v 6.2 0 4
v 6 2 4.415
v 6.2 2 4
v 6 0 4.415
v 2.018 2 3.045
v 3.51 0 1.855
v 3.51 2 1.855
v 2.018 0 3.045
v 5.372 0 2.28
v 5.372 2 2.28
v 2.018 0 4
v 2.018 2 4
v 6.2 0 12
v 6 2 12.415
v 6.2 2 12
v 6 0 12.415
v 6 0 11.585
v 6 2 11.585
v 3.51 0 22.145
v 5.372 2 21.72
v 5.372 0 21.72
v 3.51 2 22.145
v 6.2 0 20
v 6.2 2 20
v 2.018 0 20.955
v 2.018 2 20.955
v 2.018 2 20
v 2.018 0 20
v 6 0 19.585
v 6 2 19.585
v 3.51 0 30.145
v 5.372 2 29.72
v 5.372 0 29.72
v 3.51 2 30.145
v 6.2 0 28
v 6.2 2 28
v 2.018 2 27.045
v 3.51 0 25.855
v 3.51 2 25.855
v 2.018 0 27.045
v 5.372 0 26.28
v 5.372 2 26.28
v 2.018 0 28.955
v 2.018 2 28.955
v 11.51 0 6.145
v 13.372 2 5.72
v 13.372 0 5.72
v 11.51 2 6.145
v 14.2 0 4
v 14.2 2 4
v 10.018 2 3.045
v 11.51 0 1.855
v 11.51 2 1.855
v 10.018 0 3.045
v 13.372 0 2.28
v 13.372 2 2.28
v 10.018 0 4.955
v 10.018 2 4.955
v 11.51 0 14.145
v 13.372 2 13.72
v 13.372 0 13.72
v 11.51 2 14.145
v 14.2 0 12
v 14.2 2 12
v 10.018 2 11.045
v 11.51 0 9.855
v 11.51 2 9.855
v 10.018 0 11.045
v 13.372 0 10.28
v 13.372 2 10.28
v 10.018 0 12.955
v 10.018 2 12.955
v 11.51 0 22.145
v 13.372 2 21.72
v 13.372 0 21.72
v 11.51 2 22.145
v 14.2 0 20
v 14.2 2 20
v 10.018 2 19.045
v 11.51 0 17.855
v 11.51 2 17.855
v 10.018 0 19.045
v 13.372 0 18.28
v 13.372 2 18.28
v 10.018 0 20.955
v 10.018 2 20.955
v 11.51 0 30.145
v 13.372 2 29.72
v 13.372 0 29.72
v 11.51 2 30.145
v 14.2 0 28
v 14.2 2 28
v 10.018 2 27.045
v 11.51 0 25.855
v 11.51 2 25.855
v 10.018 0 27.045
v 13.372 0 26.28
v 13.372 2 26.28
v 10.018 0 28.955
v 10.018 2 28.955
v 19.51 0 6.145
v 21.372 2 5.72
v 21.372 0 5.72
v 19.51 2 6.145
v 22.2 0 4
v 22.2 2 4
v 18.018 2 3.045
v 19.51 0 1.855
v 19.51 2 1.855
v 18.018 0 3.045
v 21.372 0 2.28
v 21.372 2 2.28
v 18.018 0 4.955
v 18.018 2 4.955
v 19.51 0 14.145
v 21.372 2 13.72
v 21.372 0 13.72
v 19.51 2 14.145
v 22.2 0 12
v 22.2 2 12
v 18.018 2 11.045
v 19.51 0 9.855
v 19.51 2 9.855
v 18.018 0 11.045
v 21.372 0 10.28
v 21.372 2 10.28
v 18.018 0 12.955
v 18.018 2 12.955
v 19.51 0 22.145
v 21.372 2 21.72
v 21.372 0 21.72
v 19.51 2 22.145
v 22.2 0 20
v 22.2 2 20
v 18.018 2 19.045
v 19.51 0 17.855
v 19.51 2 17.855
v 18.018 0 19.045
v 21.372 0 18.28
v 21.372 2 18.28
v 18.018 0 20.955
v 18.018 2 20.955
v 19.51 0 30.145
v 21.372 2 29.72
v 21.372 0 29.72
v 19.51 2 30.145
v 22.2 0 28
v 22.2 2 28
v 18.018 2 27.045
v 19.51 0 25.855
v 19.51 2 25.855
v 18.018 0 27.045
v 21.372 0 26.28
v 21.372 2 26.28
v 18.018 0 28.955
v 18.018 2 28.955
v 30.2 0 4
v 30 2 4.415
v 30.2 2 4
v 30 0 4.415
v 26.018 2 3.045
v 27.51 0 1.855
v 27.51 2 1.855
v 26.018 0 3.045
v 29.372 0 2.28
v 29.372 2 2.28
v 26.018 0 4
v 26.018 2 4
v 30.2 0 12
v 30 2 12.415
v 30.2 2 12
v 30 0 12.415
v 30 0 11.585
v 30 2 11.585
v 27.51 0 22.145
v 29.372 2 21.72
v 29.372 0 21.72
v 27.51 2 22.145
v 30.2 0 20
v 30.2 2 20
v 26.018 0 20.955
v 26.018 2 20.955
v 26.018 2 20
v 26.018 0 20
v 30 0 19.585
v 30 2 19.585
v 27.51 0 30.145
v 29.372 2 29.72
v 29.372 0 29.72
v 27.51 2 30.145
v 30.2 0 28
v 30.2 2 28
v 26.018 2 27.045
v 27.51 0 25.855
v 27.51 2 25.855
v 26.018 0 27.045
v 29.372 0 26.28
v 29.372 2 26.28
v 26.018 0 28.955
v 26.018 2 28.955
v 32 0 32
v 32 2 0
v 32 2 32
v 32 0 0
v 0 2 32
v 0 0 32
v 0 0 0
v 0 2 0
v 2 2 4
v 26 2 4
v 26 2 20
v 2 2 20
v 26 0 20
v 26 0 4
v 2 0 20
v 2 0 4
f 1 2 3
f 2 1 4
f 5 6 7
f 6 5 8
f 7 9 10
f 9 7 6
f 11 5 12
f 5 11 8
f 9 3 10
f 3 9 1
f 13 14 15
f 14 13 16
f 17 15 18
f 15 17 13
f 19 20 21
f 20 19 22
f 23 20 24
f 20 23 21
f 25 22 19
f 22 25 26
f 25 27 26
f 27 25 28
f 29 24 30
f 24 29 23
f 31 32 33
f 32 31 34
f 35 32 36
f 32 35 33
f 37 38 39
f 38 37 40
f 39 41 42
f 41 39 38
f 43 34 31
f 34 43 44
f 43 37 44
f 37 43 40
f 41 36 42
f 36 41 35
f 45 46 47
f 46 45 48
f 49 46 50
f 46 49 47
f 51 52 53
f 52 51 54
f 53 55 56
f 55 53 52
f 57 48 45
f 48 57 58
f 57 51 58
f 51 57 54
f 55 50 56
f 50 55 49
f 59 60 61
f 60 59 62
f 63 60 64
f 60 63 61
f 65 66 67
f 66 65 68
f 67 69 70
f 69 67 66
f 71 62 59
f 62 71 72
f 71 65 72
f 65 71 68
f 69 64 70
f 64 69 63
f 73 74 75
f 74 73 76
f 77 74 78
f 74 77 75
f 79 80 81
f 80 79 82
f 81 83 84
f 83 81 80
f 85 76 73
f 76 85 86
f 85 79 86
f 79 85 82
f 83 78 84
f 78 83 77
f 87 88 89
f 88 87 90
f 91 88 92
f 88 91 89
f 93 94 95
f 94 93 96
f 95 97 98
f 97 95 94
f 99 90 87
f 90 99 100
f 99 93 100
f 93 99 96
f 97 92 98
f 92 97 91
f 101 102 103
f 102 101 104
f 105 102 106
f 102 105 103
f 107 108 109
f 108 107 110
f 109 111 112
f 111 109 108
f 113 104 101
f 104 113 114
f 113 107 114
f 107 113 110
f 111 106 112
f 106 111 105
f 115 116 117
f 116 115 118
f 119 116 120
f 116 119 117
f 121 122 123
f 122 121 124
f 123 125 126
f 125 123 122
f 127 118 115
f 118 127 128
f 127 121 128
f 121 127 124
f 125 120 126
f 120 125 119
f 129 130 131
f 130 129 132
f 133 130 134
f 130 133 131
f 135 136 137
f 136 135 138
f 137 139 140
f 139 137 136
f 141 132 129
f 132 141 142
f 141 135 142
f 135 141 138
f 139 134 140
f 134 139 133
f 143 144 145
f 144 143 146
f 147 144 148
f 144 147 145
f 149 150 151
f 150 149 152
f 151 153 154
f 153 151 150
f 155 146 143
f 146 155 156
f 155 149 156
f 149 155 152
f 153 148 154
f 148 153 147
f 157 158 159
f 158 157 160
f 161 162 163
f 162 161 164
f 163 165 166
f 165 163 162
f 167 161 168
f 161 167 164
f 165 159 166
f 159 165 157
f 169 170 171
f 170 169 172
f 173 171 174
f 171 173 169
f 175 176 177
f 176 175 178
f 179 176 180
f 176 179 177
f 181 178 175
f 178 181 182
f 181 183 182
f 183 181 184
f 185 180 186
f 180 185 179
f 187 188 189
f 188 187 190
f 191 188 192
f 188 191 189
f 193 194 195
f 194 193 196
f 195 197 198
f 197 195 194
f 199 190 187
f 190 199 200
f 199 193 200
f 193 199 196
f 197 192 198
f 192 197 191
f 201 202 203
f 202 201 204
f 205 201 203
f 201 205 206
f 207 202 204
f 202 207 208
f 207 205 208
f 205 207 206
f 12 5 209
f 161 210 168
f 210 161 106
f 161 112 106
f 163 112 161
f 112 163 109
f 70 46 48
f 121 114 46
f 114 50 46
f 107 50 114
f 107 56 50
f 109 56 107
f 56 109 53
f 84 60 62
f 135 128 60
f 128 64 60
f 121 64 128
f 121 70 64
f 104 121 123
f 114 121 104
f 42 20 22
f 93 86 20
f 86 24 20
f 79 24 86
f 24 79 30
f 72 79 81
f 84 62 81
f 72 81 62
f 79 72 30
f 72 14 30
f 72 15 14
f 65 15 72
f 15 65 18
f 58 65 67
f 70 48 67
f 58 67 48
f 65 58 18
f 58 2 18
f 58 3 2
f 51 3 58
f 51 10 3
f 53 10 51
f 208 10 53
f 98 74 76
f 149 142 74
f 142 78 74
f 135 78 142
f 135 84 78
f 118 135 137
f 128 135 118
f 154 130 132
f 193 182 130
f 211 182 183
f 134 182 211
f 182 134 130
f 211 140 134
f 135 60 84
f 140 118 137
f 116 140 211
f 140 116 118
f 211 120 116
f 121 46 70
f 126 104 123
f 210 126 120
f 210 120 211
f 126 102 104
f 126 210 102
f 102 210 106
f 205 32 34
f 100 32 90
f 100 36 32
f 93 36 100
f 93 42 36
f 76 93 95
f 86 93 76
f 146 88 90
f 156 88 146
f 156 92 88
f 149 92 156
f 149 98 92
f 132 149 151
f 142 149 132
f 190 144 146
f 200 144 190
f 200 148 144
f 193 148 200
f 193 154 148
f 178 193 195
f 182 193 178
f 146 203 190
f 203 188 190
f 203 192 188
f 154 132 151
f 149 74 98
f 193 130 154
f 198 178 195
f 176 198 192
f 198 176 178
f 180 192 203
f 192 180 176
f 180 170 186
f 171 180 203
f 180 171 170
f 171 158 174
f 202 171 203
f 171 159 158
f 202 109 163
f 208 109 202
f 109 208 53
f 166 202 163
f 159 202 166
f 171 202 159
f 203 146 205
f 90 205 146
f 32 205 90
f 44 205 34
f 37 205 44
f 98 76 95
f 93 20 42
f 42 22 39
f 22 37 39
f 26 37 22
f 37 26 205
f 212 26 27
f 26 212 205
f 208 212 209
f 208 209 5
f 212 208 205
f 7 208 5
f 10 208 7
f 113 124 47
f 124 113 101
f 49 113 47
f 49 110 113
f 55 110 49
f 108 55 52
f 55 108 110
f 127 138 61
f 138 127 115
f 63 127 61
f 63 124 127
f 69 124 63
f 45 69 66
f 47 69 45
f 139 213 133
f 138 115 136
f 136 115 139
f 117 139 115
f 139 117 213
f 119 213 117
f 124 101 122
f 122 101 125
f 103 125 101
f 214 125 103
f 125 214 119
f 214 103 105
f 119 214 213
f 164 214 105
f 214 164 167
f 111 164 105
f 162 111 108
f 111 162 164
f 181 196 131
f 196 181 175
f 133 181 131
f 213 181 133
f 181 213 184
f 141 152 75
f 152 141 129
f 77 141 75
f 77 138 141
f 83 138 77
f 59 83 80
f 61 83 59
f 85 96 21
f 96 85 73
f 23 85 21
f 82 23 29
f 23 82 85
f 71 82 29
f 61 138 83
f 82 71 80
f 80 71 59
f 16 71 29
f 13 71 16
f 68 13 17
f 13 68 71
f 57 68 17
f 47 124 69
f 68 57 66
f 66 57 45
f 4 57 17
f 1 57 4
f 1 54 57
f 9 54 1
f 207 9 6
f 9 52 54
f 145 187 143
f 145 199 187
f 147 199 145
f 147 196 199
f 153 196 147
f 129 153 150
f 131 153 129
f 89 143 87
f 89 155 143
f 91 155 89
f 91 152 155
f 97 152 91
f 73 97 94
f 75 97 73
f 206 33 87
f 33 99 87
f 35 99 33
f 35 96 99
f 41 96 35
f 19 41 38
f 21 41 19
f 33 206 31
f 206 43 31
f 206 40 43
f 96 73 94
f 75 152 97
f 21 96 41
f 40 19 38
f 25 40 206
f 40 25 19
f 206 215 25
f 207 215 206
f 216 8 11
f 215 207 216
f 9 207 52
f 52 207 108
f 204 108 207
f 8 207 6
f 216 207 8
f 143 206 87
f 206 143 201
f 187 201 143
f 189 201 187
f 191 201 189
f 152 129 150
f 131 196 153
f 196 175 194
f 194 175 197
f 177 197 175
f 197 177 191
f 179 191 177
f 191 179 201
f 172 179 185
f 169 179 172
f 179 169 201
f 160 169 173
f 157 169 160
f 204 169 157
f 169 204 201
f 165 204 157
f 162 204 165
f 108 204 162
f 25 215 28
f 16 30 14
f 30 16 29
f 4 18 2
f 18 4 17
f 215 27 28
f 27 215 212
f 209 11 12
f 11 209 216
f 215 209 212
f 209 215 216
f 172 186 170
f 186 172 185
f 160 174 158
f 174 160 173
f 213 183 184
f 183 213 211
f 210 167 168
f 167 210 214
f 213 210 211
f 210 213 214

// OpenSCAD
// configuration
space = 4;
hole = 4;
pad = space / 2;

width = 4;
height = 4;
thickness = 2;

difference(){

    cube([
        width*hole + (width-1)*space + 2*pad,
        thickness,
        height*hole + (height-1)*space + 2*pad
    ]);

    for(i=[1:width]) {
        for(j=[1:height]) {
            translate([
                i*hole + (i-1)*space -hole/2 + pad,
                0,
                j*hole + (j-1)*space - hole/2 + pad
            ]) {
                rotate([90, 0, 0]) {
                    translate([0, 0, -2*thickness]) {
                        cylinder(r = hole/2 + 0.2, h = 3*thickness);
                    }
                }
            }
        }
    }

    translate([pad, -thickness, pad + hole/2]) {
        cube([hole, 3*thickness, (height-2)*hole + (height-2)*space]);
    }

    translate([(width - 1)*hole + (width-1)*space + pad, -thickness, pad + hole/2]) {
        cube([hole, 3*thickness, (height-2)*hole + (height-2)*space]);
    }

}
